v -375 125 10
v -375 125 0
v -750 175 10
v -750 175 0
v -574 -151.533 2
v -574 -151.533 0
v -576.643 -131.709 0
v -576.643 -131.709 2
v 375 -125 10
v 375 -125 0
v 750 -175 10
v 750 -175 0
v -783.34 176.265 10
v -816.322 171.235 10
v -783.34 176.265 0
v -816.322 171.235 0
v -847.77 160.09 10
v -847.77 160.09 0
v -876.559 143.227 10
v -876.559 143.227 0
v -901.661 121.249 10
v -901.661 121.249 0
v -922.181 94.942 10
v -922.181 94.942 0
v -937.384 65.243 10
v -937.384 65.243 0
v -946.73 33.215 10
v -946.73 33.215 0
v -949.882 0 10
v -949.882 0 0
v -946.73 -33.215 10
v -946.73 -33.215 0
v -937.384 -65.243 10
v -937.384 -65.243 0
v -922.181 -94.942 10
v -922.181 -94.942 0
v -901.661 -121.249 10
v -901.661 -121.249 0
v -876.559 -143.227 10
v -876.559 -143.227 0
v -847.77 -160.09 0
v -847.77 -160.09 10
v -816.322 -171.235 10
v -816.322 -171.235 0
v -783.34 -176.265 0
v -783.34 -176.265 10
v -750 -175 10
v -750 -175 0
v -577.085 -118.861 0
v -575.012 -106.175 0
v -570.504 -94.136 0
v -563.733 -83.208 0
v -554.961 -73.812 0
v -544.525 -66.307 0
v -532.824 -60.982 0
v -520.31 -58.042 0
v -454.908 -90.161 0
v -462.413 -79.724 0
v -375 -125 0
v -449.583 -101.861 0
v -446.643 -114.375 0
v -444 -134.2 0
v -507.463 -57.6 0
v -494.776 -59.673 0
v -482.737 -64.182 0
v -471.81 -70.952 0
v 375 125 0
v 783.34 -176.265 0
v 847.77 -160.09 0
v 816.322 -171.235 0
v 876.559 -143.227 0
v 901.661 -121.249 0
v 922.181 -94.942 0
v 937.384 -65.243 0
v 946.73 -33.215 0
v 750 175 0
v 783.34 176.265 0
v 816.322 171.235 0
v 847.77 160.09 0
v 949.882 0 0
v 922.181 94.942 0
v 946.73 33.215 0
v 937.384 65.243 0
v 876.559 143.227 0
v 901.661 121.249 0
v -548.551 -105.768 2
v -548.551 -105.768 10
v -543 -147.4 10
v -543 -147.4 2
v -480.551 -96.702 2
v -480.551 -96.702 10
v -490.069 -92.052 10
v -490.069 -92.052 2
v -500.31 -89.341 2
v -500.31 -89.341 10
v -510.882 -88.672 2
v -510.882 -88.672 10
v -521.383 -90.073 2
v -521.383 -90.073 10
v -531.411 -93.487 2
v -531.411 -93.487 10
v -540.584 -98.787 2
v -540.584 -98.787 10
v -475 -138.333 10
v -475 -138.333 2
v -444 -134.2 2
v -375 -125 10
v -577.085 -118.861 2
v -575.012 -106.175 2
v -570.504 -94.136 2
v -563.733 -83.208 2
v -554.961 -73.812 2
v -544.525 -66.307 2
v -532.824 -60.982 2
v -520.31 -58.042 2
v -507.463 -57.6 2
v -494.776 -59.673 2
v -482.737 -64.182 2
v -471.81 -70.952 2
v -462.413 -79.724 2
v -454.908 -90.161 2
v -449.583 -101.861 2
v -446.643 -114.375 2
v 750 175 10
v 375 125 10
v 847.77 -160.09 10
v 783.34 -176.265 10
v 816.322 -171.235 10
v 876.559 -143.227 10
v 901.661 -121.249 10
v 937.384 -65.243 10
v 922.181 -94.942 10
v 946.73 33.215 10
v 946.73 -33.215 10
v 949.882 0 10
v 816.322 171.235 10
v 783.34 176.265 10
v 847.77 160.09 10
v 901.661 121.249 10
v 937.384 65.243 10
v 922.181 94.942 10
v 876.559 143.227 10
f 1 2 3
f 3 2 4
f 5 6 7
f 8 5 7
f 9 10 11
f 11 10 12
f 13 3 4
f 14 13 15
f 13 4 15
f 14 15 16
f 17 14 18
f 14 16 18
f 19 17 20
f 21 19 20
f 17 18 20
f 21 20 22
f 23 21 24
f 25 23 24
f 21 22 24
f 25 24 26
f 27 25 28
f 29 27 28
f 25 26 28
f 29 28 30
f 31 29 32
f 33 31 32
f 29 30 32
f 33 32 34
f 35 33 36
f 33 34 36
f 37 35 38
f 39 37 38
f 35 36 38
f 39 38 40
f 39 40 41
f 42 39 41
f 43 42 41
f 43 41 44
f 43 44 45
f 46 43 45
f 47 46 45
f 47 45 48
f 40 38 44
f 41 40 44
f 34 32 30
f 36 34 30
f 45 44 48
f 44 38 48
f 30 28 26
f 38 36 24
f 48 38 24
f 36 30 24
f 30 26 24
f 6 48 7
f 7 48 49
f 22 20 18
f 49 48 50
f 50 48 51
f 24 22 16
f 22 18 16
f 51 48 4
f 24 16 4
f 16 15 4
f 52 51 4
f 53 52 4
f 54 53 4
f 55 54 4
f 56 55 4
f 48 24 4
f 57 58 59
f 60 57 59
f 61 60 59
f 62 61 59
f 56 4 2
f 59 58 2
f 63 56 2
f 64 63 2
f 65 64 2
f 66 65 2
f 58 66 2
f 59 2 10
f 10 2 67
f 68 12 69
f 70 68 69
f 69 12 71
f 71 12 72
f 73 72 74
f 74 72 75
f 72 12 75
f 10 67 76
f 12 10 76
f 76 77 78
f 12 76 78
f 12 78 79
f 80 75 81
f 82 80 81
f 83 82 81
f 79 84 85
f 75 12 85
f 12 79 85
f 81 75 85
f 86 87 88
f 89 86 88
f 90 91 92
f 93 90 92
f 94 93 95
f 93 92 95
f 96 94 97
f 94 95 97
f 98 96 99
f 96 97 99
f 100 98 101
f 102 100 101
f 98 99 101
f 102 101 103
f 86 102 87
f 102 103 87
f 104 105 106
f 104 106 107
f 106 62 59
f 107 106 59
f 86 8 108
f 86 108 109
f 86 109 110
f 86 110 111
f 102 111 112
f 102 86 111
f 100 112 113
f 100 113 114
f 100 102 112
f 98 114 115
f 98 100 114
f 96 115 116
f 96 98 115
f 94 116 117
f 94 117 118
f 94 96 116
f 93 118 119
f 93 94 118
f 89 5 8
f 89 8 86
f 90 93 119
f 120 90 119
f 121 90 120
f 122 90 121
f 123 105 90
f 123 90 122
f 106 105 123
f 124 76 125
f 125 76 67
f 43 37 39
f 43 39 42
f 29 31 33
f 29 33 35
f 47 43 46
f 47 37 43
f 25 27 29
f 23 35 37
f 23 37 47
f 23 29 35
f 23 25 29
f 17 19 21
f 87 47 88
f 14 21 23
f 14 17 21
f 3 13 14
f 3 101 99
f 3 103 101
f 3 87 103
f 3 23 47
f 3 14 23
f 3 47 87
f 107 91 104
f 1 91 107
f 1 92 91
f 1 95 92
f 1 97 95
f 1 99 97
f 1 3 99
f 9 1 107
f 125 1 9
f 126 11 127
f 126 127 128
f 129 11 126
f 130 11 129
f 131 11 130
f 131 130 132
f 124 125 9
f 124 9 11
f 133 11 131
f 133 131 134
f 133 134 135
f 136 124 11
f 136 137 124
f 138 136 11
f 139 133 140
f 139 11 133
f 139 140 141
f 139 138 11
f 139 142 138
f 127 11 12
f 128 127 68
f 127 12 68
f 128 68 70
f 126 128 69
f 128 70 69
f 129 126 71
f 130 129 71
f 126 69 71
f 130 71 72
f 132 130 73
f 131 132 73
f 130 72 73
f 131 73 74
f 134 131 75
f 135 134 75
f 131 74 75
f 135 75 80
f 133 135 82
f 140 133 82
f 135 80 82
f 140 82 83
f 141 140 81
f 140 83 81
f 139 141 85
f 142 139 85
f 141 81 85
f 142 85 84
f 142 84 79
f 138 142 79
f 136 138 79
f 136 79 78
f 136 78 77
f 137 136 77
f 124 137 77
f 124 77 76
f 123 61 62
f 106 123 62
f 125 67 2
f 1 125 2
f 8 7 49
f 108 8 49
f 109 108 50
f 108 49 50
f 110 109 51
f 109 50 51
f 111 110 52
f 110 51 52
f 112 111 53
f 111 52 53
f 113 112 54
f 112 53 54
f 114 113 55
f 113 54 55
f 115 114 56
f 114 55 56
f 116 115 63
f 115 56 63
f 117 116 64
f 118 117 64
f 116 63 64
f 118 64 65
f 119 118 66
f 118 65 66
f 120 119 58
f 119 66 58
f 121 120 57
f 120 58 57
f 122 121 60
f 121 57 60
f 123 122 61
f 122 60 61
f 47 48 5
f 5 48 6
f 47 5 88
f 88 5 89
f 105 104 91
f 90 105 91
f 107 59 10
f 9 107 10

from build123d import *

# Parameters (mm, degrees)
F2_DEPTH = 10
F4_DEPTH = 10.001
F6_DEPTH = 2


with BuildPart() as f2:
    # F1 (on Top) → F2 (new body)
    with BuildSketch(Plane.XY):
        with BuildLine():
            Line((375, 125), (0, 125))
            Line((0, 125), (-375, 125))
            Line((-375, 125), (-750, 175))
            ThreePointArc((-750, 175), (-949.8820360883, 0), (-750, -175))
            Line((-750, -175), (-375, -125))
            Line((-375, -125), (0, -125))
            Line((0, -125), (375, -125))
            Line((375, -125), (750, -175))
            ThreePointArc((750, -175), (949.8820360883, 0), (750, 175))
            Line((750, 175), (375, 125))
        make_face()
    extrude(amount=F2_DEPTH)

    # F3 (on face) → F4 (cut, through all)
    with BuildSketch(Plane.XY.offset(10)):
        with BuildLine():
            Line((-543, -147.4), (-475, -138.3333333333))
            Line((-475, -138.3333333333), (-480.5508762438, -96.7017615047))
            ThreePointArc((-480.5508762438, -96.7017615047), (-516.1668220423, -89.1155013498), (-548.5508762438, -105.7684281713))
            Line((-548.5508762438, -105.7684281713), (-543, -147.4))
        make_face()
    extrude(amount=-F4_DEPTH, mode=Mode.SUBTRACT)

    # F5 (on face) → F6 (cut)
    with BuildSketch(Plane(origin=(0, 0, 0), x_dir=(1, 0, 0), z_dir=(0, 0, -1))):
        with BuildLine():
            Line((-543, 147.4), (-574, 151.5333333333))
            Line((-574, 151.5333333333), (-576.6432744018, 131.7087753197))
            ThreePointArc((-576.6432744018, 131.7087753197), (-520.3099410685, 58.042108653), (-446.6432744018, 114.3754419863))
            Line((-446.6432744018, 114.3754419863), (-444, 134.2))
            Line((-444, 134.2), (-475, 138.3333333333))
            Line((-475, 138.3333333333), (-480.5508762438, 96.7017615047))
            ThreePointArc((-480.5508762438, 96.7017615047), (-516.1668220423, 89.1155013498), (-548.5508762438, 105.7684281713))
            Line((-548.5508762438, 105.7684281713), (-543, 147.4))
        make_face()
    extrude(amount=-F6_DEPTH, mode=Mode.SUBTRACT)


solid = f2.part
